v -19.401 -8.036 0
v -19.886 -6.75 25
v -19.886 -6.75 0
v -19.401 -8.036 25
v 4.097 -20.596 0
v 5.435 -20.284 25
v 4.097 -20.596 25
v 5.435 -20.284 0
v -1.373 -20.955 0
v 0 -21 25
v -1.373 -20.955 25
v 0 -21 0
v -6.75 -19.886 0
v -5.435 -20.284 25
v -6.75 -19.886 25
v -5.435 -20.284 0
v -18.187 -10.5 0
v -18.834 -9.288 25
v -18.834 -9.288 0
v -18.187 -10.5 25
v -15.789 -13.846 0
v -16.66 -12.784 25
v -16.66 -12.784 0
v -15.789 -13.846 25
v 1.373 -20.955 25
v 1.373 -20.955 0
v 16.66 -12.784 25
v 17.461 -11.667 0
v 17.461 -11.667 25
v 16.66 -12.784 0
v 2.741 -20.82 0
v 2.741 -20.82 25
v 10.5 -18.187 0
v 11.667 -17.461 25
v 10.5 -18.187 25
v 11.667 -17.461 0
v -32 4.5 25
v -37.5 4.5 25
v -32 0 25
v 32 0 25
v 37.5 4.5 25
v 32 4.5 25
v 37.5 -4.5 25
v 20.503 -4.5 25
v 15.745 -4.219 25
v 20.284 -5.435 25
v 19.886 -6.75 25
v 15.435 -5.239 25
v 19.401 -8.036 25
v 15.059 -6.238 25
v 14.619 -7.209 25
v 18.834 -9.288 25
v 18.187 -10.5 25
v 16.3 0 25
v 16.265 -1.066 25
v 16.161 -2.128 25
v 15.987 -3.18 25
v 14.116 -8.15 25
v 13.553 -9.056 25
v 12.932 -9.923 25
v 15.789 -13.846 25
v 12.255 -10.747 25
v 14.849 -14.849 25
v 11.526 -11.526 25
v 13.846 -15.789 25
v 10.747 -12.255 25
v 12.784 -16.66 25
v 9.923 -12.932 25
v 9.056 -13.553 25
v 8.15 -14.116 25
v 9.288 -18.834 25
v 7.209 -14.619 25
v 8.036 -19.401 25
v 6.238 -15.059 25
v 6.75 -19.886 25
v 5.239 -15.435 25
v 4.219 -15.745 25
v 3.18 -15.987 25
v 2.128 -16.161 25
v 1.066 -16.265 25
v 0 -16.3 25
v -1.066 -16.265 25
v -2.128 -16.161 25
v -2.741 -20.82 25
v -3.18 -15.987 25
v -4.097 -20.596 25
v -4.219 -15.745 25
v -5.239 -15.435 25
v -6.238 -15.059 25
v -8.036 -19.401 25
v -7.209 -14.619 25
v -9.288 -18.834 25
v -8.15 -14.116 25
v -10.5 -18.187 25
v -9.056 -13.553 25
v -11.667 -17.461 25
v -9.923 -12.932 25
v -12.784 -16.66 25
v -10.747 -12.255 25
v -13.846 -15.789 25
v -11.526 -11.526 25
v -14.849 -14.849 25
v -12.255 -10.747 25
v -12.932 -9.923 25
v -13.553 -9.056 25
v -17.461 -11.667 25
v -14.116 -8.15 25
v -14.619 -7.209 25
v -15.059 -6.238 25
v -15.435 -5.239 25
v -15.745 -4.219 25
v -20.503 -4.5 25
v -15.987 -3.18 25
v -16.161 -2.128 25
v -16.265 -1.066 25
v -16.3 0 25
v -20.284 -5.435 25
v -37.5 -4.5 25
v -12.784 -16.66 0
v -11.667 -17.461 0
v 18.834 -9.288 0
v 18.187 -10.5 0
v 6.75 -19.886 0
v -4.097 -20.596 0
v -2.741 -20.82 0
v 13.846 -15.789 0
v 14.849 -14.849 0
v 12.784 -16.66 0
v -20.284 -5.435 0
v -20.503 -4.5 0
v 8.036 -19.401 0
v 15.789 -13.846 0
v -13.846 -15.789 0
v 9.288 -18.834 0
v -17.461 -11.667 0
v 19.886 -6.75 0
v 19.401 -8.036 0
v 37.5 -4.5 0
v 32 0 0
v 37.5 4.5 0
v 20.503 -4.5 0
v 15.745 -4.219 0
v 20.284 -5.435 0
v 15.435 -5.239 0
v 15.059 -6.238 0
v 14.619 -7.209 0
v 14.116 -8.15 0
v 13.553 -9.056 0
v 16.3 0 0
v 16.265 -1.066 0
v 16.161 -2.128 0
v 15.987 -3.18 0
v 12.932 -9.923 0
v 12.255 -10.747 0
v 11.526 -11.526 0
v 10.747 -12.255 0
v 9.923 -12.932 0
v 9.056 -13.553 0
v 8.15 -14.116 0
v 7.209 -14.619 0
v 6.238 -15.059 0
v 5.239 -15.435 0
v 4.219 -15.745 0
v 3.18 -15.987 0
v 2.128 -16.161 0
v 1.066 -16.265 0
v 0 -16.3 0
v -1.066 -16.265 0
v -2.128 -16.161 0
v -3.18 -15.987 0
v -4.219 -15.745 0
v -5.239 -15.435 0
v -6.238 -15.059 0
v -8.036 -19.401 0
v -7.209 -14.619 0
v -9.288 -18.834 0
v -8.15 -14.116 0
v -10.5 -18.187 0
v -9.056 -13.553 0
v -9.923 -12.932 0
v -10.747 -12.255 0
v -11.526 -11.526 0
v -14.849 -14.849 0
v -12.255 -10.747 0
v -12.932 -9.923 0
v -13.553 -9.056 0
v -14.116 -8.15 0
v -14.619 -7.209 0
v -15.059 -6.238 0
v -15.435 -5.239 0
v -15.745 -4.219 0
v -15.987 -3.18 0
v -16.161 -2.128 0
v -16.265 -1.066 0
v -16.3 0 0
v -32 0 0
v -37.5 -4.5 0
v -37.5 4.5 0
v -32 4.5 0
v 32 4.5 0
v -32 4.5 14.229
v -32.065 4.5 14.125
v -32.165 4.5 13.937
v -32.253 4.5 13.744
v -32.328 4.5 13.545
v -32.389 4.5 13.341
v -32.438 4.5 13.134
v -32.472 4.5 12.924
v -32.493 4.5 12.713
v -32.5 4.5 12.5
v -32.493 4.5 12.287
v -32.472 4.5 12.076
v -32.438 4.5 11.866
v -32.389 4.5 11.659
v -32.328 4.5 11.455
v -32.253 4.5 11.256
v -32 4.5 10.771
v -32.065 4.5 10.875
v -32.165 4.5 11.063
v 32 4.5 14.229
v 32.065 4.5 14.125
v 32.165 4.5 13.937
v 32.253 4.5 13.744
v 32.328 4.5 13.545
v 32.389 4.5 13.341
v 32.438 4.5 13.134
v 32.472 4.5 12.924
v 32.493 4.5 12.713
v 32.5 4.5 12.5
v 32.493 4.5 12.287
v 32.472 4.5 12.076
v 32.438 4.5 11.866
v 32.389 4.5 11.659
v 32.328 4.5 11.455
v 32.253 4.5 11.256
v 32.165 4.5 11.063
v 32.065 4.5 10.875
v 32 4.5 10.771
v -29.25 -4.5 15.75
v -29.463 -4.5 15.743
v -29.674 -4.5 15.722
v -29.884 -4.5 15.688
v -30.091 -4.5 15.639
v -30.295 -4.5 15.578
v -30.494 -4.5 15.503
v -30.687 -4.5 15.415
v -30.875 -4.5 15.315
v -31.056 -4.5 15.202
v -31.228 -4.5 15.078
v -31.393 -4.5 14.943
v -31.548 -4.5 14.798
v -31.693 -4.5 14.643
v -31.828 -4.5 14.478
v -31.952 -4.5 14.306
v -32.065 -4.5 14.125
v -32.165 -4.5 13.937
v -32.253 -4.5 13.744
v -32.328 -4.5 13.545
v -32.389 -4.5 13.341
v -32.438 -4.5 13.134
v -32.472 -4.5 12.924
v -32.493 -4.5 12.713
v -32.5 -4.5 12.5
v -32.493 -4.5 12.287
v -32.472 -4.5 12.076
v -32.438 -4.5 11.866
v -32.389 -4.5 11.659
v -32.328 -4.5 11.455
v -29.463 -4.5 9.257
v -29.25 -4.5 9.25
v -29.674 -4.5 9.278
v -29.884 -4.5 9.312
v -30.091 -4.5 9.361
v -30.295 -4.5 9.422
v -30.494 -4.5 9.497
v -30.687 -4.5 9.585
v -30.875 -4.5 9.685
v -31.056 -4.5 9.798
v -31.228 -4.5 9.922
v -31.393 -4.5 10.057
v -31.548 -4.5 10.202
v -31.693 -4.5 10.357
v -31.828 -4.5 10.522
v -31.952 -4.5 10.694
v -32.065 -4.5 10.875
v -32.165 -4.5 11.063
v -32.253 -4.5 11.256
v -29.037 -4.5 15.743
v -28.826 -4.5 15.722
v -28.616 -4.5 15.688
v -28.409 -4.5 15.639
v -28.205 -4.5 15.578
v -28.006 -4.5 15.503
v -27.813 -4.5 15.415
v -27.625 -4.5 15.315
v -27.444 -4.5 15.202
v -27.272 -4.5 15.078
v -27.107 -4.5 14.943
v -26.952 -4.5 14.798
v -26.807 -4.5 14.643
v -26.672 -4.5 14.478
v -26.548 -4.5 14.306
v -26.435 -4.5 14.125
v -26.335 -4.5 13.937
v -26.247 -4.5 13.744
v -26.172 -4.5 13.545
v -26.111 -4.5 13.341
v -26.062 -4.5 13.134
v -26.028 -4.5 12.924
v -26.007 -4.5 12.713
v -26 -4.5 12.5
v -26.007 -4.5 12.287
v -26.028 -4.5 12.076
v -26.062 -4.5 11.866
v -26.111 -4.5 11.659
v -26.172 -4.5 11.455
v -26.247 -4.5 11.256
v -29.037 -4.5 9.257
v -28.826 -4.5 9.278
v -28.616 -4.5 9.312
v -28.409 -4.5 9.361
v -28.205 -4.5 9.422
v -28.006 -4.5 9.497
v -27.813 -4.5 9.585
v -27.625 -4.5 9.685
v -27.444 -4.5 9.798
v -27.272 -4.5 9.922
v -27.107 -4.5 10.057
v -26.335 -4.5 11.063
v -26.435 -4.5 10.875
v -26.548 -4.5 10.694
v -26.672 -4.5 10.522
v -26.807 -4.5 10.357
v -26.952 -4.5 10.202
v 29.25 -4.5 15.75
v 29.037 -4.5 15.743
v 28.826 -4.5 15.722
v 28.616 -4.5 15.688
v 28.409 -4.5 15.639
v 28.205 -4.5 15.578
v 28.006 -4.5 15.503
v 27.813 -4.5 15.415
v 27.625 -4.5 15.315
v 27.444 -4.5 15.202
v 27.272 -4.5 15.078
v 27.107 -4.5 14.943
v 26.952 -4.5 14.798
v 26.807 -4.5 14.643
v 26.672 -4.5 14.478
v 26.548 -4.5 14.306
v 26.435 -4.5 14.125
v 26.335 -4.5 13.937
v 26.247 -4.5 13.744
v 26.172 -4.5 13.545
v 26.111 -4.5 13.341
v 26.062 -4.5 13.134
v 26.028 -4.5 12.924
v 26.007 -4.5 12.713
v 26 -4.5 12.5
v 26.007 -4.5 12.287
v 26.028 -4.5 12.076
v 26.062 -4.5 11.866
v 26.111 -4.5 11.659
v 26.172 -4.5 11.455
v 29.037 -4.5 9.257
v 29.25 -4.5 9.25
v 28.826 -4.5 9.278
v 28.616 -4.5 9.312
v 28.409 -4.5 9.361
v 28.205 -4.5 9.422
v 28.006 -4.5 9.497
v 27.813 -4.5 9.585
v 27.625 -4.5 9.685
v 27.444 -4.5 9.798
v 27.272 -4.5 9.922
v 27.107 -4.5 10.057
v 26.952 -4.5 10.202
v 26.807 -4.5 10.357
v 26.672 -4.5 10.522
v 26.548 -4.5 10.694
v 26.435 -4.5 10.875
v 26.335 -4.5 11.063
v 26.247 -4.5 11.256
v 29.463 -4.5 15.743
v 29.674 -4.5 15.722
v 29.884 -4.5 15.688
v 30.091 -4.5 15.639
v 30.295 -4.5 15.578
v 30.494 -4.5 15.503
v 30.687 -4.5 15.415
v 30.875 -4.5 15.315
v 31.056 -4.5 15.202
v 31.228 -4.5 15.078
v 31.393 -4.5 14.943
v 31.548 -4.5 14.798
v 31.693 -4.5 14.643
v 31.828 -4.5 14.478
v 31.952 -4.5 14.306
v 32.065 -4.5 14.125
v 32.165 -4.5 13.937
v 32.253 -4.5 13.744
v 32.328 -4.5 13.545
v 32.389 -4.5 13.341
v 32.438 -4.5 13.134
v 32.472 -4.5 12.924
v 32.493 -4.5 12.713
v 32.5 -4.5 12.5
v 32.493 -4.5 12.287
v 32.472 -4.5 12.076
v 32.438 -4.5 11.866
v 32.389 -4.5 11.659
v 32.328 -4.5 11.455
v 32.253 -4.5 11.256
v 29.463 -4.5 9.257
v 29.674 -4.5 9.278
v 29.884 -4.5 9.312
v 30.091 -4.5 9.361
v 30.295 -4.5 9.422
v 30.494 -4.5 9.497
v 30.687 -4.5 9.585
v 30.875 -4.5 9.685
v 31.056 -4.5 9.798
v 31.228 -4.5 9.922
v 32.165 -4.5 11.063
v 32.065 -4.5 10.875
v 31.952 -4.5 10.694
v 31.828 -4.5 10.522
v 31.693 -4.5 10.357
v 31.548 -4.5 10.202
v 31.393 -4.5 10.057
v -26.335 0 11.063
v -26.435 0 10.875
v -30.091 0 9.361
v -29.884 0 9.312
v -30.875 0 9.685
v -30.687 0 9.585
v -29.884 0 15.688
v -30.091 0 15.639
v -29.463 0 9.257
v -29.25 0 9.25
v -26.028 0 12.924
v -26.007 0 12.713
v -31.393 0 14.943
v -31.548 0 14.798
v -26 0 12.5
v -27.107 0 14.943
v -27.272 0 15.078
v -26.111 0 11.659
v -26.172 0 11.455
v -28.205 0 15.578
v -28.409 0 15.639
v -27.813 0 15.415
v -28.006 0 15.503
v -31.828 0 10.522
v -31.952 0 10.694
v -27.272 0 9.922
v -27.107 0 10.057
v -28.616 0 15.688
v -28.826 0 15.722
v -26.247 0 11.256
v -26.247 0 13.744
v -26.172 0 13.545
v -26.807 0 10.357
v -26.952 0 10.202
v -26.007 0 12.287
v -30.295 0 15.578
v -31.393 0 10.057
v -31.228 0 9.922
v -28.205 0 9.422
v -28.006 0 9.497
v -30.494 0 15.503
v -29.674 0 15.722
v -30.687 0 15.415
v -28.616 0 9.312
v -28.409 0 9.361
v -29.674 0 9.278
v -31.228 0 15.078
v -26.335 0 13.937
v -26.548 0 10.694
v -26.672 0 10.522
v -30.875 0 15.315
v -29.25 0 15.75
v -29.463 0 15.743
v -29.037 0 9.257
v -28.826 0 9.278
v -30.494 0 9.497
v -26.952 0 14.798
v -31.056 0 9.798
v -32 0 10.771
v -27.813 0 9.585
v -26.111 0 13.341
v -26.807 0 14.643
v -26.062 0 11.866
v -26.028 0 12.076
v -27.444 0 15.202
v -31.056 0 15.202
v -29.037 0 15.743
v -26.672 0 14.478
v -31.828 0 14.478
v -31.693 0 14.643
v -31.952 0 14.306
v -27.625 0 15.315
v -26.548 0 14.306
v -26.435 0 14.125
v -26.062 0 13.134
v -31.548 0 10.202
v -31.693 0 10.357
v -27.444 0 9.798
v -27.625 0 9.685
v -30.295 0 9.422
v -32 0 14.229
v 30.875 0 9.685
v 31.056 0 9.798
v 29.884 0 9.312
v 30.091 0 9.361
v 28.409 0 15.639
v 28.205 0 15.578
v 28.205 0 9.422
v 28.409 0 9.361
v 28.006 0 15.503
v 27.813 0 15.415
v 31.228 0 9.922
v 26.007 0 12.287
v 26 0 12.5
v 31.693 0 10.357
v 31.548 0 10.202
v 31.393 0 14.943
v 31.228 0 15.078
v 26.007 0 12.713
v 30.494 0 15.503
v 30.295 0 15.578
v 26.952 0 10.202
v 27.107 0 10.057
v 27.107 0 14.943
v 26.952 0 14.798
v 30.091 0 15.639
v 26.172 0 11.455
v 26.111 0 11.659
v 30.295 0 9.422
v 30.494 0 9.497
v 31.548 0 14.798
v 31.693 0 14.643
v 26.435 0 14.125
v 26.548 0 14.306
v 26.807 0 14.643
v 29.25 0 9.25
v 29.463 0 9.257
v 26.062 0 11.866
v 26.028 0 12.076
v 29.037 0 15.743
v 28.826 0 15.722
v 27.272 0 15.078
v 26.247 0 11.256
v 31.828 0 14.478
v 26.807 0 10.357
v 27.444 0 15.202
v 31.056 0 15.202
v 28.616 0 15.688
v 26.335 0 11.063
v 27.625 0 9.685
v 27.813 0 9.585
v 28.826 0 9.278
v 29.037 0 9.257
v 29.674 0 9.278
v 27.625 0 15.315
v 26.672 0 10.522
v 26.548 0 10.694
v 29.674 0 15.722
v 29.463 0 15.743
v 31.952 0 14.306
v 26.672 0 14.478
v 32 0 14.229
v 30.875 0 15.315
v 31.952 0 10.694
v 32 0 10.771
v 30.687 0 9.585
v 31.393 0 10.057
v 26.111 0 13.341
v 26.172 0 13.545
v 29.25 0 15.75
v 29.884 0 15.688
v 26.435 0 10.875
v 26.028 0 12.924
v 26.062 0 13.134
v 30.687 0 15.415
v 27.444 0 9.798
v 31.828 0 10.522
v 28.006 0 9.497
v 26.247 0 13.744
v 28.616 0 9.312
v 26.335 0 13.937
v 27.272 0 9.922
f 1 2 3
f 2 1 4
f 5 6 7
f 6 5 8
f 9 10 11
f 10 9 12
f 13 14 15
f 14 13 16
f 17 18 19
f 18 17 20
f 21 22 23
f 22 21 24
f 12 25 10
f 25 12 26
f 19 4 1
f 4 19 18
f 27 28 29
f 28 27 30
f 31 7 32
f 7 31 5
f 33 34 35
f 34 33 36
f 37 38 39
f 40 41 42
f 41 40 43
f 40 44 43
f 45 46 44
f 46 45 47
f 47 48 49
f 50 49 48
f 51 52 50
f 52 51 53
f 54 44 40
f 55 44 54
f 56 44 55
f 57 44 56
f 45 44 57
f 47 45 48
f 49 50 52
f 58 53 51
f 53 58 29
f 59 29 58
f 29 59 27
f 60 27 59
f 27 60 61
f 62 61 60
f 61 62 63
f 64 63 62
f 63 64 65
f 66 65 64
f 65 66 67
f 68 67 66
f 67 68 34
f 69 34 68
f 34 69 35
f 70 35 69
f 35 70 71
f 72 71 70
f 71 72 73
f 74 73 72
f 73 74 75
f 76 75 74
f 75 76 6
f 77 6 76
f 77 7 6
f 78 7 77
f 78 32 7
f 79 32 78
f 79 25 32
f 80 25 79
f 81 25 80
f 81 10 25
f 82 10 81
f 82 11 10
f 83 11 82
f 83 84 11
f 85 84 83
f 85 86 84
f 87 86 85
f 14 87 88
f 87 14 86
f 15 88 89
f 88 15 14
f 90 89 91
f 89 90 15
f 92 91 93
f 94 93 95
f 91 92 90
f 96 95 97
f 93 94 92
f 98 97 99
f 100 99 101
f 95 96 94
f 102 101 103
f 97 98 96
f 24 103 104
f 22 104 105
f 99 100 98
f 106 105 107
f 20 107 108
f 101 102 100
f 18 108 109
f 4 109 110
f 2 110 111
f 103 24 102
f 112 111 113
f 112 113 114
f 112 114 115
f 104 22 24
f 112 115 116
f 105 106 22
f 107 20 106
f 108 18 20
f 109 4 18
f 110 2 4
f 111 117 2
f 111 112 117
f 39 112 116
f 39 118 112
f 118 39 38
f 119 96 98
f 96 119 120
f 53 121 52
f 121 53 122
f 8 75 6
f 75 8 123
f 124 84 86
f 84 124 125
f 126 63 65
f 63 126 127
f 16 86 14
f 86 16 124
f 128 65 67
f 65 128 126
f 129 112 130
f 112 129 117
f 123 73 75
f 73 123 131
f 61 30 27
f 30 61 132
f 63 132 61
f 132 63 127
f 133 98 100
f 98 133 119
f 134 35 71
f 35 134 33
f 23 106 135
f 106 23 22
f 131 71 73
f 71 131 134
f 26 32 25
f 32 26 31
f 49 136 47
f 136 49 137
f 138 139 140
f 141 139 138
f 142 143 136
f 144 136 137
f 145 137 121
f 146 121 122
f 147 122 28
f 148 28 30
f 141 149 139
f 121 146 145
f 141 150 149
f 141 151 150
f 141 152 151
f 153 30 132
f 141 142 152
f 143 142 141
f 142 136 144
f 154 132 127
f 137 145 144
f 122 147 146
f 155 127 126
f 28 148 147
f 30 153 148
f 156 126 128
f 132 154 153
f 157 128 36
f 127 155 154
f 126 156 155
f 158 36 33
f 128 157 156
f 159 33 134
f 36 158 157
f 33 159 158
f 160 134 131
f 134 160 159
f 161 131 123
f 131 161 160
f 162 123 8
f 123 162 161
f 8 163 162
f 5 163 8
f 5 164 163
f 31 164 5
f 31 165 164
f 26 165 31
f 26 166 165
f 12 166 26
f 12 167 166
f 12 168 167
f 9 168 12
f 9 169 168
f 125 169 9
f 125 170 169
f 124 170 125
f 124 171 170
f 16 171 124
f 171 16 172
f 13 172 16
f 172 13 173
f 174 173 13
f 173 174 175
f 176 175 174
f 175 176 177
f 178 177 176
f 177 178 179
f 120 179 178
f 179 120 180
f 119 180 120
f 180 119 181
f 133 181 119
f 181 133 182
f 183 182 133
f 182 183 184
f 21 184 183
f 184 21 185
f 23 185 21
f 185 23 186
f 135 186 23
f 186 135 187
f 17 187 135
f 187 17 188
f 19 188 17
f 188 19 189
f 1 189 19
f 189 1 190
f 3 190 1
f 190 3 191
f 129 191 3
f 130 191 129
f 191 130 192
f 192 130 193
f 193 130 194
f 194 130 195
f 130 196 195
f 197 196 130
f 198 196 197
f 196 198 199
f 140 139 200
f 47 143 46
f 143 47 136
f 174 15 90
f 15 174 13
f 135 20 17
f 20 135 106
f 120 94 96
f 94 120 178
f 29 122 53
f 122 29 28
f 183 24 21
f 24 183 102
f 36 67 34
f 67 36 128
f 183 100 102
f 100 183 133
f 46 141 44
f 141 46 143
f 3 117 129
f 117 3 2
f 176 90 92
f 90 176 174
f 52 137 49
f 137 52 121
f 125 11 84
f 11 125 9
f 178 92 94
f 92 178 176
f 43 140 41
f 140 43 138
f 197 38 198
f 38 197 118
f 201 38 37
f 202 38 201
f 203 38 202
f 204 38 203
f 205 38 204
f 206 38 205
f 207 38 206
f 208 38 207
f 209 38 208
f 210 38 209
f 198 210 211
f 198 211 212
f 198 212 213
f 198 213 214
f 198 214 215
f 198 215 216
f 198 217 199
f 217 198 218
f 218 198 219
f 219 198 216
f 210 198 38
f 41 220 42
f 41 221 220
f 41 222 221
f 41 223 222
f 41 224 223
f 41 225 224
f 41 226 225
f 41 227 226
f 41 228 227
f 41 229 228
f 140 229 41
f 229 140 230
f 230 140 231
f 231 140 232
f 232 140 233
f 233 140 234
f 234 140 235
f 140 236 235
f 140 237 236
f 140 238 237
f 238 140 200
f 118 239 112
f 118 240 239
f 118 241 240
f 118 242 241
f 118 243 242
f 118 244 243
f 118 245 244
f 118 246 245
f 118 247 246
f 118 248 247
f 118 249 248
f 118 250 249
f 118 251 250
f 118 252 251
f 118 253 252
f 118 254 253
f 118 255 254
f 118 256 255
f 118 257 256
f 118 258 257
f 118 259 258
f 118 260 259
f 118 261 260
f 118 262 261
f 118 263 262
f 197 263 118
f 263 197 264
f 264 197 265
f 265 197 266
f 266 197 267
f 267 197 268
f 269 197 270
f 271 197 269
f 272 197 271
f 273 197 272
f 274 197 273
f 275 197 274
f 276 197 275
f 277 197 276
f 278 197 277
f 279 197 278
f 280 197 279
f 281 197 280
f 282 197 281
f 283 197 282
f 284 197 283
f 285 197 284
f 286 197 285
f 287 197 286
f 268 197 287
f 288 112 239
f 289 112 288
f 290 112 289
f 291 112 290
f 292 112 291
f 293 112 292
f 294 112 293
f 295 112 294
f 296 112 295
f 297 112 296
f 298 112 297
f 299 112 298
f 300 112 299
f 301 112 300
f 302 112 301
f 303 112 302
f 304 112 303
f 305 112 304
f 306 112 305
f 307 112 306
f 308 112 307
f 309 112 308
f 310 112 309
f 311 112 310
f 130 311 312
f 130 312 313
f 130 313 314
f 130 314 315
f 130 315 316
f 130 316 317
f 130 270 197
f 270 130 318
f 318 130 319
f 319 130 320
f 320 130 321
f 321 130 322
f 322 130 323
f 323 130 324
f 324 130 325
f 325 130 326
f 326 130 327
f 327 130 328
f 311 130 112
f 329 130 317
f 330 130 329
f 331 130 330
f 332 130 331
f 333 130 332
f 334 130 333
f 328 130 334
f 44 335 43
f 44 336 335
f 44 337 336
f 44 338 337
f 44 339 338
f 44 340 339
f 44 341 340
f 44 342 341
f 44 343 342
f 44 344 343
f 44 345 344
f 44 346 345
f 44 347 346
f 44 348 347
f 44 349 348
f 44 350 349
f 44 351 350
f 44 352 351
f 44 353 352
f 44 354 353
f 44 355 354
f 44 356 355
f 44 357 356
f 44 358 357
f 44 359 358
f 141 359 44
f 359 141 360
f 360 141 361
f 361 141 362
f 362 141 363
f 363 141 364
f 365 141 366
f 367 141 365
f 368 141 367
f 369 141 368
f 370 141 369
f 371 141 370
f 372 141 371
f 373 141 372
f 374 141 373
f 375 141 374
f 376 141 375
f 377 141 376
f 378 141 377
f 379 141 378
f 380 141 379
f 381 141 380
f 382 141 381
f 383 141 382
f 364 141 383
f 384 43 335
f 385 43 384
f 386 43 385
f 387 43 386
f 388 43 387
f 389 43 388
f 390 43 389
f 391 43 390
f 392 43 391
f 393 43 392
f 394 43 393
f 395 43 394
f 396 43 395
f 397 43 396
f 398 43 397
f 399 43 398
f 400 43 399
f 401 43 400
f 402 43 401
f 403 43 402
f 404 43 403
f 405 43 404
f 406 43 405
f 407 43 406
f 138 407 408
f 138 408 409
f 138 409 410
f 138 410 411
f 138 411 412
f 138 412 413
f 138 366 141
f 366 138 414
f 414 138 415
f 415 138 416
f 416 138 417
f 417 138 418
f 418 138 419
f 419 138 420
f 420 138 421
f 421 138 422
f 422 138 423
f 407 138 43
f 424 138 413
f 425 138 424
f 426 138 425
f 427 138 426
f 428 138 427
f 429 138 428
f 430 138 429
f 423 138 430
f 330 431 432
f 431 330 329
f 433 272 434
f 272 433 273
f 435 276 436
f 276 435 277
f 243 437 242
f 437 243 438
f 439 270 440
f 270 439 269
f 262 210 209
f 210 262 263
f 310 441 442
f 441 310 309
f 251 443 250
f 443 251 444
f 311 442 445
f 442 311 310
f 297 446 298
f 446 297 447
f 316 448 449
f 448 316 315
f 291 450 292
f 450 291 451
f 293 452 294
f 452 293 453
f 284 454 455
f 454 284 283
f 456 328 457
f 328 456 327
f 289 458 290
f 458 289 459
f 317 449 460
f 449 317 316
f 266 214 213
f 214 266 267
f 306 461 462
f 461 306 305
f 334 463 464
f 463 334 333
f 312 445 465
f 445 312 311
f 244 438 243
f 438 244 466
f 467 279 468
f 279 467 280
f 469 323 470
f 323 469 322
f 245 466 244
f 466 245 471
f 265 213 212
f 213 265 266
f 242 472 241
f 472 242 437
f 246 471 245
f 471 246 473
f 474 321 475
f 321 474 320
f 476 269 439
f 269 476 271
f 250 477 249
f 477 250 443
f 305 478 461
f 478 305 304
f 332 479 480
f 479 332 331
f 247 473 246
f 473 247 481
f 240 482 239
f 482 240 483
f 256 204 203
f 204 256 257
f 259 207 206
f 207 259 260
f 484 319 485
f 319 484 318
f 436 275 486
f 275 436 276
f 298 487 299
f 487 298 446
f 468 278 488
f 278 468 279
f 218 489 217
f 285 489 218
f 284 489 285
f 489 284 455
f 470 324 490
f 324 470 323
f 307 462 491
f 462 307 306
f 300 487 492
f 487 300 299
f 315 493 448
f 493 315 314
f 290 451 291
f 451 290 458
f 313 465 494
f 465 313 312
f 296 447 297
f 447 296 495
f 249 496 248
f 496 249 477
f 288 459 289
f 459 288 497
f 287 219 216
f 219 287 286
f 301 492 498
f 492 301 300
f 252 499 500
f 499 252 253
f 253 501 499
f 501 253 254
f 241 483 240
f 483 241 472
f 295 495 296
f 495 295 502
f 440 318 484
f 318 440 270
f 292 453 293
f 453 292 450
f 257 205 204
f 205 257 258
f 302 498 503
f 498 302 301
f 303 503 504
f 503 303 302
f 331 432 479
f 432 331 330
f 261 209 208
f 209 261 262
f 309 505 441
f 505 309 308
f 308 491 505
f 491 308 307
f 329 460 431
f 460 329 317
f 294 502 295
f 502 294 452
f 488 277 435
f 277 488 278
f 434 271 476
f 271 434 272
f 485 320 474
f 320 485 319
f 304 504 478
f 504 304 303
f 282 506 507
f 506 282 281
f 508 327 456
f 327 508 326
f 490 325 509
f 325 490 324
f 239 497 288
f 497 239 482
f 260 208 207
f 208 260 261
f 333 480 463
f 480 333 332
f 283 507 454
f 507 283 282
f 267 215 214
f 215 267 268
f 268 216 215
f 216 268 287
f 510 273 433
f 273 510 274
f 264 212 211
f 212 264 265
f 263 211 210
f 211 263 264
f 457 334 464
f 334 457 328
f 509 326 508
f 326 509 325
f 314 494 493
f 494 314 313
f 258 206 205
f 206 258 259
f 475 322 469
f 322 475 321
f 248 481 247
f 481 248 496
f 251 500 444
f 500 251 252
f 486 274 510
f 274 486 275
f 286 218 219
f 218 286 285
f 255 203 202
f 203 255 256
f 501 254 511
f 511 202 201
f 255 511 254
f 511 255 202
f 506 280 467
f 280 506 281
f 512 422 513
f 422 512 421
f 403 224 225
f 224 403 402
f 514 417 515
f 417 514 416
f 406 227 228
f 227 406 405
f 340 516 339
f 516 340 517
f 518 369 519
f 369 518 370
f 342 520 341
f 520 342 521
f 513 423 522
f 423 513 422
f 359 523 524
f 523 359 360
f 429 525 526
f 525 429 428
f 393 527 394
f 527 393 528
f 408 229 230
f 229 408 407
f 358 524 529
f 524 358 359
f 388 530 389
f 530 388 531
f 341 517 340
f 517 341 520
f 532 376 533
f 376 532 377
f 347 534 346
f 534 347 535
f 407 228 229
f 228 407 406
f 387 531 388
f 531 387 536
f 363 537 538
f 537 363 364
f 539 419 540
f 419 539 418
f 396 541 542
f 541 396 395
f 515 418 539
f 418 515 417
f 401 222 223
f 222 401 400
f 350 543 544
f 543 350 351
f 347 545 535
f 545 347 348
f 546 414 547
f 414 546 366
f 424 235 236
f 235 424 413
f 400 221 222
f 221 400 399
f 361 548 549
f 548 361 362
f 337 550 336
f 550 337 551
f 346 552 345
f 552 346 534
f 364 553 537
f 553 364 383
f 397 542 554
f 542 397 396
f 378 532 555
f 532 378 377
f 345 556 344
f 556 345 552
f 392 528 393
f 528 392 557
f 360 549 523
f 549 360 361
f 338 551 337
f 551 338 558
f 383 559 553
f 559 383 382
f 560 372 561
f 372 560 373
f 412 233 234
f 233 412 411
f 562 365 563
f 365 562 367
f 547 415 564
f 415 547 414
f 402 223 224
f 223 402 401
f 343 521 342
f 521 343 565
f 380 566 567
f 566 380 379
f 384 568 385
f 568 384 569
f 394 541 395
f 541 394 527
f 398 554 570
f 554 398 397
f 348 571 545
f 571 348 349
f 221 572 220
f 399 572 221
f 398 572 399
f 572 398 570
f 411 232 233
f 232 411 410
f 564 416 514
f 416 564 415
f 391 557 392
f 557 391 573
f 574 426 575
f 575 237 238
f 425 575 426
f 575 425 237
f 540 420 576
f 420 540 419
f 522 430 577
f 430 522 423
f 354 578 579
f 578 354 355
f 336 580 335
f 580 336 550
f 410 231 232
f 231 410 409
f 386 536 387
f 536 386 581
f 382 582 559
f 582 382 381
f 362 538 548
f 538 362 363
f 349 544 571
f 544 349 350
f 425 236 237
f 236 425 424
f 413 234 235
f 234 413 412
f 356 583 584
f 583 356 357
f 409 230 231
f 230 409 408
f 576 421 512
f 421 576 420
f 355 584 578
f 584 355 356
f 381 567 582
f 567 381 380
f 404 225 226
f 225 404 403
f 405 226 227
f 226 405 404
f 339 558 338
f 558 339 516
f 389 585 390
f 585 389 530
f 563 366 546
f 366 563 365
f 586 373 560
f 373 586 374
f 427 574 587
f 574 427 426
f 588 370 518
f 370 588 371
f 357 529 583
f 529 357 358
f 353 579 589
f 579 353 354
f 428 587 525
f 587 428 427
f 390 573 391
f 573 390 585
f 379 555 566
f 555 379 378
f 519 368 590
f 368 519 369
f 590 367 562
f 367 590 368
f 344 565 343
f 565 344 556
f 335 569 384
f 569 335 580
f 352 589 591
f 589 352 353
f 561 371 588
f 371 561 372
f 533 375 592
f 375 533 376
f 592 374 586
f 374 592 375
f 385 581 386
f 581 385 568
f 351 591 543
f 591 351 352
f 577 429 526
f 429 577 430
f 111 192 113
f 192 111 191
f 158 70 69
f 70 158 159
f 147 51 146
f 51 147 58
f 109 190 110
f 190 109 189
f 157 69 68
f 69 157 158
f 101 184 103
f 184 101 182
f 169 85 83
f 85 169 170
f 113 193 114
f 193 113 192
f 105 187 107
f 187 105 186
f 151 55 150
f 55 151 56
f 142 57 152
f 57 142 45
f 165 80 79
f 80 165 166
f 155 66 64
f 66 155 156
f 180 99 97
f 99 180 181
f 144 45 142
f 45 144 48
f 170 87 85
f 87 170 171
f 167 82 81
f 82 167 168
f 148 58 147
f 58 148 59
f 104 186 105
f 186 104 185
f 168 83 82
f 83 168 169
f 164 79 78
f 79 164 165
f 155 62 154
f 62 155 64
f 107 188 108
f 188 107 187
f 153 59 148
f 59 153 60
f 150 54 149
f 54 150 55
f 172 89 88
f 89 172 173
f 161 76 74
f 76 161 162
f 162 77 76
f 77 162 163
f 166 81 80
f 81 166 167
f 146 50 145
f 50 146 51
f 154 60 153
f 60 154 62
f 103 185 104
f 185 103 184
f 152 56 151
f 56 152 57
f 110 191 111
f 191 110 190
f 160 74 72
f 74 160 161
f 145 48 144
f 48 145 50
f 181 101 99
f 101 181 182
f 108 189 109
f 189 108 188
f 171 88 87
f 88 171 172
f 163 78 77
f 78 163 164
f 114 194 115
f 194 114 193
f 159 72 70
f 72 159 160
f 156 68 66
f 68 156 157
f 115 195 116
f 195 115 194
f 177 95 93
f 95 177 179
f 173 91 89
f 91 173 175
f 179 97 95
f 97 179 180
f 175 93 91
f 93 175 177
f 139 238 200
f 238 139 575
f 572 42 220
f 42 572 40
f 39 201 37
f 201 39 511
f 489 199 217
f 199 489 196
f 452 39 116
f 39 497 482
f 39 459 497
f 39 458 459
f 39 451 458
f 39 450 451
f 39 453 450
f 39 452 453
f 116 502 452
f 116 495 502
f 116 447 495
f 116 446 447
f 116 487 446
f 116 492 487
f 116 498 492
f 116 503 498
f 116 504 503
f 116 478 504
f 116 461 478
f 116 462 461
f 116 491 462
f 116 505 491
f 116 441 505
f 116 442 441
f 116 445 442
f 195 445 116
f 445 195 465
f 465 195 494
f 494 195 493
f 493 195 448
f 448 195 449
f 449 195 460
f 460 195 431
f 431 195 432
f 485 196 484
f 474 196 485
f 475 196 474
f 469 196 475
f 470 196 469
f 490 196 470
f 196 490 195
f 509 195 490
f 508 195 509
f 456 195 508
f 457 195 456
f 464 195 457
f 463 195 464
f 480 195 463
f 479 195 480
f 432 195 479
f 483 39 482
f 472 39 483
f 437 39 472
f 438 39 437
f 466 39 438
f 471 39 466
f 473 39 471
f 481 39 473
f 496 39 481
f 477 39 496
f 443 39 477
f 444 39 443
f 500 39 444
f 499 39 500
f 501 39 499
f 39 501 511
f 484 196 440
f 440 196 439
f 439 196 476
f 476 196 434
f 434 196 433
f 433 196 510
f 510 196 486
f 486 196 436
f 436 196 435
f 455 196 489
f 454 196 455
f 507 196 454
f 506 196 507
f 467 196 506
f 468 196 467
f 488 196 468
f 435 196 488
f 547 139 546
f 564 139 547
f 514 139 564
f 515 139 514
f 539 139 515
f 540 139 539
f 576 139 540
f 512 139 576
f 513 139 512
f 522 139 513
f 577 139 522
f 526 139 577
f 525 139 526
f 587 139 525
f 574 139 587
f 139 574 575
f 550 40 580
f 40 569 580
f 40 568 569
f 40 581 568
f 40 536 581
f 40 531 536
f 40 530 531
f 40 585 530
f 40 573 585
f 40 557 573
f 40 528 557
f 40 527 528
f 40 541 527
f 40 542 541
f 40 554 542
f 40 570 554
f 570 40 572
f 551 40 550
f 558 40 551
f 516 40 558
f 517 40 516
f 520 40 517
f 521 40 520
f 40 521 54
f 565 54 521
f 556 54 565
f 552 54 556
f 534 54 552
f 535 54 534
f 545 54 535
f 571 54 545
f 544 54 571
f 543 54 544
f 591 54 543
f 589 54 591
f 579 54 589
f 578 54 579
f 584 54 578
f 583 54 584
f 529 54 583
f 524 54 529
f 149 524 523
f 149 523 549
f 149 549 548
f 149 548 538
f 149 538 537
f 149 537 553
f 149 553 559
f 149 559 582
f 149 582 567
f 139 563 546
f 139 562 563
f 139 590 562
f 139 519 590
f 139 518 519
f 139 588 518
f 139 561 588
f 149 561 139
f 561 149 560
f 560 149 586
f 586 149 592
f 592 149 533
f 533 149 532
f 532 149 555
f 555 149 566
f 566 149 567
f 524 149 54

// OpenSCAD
// Mast / pipe saddle clamp half (print two, bolt together, or bolt one to a wall). CC0.
pipe = 32; wid = 25; wall = 5; bolt = 6.5;
$fn = 96;
ear = bolt + 10;
difference() {
  union() {
    cylinder(d = pipe + 2 * wall, h = wid);
    translate([-(pipe / 2 + wall + ear), -wall / 2 - 2, 0]) cube([pipe + 2 * wall + 2 * ear, wall + 4, wid]);
  }
  translate([0, 0, -1]) cylinder(d = pipe + 0.6, h = wid + 2);
  translate([-pipe, 0, -1]) cube([2 * pipe, pipe, wid + 2]);
  for (s = [-1, 1]) translate([s * (pipe / 2 + wall + ear / 2), 10, wid / 2]) rotate([90, 0, 0]) cylinder(d = bolt, h = 30);
}
